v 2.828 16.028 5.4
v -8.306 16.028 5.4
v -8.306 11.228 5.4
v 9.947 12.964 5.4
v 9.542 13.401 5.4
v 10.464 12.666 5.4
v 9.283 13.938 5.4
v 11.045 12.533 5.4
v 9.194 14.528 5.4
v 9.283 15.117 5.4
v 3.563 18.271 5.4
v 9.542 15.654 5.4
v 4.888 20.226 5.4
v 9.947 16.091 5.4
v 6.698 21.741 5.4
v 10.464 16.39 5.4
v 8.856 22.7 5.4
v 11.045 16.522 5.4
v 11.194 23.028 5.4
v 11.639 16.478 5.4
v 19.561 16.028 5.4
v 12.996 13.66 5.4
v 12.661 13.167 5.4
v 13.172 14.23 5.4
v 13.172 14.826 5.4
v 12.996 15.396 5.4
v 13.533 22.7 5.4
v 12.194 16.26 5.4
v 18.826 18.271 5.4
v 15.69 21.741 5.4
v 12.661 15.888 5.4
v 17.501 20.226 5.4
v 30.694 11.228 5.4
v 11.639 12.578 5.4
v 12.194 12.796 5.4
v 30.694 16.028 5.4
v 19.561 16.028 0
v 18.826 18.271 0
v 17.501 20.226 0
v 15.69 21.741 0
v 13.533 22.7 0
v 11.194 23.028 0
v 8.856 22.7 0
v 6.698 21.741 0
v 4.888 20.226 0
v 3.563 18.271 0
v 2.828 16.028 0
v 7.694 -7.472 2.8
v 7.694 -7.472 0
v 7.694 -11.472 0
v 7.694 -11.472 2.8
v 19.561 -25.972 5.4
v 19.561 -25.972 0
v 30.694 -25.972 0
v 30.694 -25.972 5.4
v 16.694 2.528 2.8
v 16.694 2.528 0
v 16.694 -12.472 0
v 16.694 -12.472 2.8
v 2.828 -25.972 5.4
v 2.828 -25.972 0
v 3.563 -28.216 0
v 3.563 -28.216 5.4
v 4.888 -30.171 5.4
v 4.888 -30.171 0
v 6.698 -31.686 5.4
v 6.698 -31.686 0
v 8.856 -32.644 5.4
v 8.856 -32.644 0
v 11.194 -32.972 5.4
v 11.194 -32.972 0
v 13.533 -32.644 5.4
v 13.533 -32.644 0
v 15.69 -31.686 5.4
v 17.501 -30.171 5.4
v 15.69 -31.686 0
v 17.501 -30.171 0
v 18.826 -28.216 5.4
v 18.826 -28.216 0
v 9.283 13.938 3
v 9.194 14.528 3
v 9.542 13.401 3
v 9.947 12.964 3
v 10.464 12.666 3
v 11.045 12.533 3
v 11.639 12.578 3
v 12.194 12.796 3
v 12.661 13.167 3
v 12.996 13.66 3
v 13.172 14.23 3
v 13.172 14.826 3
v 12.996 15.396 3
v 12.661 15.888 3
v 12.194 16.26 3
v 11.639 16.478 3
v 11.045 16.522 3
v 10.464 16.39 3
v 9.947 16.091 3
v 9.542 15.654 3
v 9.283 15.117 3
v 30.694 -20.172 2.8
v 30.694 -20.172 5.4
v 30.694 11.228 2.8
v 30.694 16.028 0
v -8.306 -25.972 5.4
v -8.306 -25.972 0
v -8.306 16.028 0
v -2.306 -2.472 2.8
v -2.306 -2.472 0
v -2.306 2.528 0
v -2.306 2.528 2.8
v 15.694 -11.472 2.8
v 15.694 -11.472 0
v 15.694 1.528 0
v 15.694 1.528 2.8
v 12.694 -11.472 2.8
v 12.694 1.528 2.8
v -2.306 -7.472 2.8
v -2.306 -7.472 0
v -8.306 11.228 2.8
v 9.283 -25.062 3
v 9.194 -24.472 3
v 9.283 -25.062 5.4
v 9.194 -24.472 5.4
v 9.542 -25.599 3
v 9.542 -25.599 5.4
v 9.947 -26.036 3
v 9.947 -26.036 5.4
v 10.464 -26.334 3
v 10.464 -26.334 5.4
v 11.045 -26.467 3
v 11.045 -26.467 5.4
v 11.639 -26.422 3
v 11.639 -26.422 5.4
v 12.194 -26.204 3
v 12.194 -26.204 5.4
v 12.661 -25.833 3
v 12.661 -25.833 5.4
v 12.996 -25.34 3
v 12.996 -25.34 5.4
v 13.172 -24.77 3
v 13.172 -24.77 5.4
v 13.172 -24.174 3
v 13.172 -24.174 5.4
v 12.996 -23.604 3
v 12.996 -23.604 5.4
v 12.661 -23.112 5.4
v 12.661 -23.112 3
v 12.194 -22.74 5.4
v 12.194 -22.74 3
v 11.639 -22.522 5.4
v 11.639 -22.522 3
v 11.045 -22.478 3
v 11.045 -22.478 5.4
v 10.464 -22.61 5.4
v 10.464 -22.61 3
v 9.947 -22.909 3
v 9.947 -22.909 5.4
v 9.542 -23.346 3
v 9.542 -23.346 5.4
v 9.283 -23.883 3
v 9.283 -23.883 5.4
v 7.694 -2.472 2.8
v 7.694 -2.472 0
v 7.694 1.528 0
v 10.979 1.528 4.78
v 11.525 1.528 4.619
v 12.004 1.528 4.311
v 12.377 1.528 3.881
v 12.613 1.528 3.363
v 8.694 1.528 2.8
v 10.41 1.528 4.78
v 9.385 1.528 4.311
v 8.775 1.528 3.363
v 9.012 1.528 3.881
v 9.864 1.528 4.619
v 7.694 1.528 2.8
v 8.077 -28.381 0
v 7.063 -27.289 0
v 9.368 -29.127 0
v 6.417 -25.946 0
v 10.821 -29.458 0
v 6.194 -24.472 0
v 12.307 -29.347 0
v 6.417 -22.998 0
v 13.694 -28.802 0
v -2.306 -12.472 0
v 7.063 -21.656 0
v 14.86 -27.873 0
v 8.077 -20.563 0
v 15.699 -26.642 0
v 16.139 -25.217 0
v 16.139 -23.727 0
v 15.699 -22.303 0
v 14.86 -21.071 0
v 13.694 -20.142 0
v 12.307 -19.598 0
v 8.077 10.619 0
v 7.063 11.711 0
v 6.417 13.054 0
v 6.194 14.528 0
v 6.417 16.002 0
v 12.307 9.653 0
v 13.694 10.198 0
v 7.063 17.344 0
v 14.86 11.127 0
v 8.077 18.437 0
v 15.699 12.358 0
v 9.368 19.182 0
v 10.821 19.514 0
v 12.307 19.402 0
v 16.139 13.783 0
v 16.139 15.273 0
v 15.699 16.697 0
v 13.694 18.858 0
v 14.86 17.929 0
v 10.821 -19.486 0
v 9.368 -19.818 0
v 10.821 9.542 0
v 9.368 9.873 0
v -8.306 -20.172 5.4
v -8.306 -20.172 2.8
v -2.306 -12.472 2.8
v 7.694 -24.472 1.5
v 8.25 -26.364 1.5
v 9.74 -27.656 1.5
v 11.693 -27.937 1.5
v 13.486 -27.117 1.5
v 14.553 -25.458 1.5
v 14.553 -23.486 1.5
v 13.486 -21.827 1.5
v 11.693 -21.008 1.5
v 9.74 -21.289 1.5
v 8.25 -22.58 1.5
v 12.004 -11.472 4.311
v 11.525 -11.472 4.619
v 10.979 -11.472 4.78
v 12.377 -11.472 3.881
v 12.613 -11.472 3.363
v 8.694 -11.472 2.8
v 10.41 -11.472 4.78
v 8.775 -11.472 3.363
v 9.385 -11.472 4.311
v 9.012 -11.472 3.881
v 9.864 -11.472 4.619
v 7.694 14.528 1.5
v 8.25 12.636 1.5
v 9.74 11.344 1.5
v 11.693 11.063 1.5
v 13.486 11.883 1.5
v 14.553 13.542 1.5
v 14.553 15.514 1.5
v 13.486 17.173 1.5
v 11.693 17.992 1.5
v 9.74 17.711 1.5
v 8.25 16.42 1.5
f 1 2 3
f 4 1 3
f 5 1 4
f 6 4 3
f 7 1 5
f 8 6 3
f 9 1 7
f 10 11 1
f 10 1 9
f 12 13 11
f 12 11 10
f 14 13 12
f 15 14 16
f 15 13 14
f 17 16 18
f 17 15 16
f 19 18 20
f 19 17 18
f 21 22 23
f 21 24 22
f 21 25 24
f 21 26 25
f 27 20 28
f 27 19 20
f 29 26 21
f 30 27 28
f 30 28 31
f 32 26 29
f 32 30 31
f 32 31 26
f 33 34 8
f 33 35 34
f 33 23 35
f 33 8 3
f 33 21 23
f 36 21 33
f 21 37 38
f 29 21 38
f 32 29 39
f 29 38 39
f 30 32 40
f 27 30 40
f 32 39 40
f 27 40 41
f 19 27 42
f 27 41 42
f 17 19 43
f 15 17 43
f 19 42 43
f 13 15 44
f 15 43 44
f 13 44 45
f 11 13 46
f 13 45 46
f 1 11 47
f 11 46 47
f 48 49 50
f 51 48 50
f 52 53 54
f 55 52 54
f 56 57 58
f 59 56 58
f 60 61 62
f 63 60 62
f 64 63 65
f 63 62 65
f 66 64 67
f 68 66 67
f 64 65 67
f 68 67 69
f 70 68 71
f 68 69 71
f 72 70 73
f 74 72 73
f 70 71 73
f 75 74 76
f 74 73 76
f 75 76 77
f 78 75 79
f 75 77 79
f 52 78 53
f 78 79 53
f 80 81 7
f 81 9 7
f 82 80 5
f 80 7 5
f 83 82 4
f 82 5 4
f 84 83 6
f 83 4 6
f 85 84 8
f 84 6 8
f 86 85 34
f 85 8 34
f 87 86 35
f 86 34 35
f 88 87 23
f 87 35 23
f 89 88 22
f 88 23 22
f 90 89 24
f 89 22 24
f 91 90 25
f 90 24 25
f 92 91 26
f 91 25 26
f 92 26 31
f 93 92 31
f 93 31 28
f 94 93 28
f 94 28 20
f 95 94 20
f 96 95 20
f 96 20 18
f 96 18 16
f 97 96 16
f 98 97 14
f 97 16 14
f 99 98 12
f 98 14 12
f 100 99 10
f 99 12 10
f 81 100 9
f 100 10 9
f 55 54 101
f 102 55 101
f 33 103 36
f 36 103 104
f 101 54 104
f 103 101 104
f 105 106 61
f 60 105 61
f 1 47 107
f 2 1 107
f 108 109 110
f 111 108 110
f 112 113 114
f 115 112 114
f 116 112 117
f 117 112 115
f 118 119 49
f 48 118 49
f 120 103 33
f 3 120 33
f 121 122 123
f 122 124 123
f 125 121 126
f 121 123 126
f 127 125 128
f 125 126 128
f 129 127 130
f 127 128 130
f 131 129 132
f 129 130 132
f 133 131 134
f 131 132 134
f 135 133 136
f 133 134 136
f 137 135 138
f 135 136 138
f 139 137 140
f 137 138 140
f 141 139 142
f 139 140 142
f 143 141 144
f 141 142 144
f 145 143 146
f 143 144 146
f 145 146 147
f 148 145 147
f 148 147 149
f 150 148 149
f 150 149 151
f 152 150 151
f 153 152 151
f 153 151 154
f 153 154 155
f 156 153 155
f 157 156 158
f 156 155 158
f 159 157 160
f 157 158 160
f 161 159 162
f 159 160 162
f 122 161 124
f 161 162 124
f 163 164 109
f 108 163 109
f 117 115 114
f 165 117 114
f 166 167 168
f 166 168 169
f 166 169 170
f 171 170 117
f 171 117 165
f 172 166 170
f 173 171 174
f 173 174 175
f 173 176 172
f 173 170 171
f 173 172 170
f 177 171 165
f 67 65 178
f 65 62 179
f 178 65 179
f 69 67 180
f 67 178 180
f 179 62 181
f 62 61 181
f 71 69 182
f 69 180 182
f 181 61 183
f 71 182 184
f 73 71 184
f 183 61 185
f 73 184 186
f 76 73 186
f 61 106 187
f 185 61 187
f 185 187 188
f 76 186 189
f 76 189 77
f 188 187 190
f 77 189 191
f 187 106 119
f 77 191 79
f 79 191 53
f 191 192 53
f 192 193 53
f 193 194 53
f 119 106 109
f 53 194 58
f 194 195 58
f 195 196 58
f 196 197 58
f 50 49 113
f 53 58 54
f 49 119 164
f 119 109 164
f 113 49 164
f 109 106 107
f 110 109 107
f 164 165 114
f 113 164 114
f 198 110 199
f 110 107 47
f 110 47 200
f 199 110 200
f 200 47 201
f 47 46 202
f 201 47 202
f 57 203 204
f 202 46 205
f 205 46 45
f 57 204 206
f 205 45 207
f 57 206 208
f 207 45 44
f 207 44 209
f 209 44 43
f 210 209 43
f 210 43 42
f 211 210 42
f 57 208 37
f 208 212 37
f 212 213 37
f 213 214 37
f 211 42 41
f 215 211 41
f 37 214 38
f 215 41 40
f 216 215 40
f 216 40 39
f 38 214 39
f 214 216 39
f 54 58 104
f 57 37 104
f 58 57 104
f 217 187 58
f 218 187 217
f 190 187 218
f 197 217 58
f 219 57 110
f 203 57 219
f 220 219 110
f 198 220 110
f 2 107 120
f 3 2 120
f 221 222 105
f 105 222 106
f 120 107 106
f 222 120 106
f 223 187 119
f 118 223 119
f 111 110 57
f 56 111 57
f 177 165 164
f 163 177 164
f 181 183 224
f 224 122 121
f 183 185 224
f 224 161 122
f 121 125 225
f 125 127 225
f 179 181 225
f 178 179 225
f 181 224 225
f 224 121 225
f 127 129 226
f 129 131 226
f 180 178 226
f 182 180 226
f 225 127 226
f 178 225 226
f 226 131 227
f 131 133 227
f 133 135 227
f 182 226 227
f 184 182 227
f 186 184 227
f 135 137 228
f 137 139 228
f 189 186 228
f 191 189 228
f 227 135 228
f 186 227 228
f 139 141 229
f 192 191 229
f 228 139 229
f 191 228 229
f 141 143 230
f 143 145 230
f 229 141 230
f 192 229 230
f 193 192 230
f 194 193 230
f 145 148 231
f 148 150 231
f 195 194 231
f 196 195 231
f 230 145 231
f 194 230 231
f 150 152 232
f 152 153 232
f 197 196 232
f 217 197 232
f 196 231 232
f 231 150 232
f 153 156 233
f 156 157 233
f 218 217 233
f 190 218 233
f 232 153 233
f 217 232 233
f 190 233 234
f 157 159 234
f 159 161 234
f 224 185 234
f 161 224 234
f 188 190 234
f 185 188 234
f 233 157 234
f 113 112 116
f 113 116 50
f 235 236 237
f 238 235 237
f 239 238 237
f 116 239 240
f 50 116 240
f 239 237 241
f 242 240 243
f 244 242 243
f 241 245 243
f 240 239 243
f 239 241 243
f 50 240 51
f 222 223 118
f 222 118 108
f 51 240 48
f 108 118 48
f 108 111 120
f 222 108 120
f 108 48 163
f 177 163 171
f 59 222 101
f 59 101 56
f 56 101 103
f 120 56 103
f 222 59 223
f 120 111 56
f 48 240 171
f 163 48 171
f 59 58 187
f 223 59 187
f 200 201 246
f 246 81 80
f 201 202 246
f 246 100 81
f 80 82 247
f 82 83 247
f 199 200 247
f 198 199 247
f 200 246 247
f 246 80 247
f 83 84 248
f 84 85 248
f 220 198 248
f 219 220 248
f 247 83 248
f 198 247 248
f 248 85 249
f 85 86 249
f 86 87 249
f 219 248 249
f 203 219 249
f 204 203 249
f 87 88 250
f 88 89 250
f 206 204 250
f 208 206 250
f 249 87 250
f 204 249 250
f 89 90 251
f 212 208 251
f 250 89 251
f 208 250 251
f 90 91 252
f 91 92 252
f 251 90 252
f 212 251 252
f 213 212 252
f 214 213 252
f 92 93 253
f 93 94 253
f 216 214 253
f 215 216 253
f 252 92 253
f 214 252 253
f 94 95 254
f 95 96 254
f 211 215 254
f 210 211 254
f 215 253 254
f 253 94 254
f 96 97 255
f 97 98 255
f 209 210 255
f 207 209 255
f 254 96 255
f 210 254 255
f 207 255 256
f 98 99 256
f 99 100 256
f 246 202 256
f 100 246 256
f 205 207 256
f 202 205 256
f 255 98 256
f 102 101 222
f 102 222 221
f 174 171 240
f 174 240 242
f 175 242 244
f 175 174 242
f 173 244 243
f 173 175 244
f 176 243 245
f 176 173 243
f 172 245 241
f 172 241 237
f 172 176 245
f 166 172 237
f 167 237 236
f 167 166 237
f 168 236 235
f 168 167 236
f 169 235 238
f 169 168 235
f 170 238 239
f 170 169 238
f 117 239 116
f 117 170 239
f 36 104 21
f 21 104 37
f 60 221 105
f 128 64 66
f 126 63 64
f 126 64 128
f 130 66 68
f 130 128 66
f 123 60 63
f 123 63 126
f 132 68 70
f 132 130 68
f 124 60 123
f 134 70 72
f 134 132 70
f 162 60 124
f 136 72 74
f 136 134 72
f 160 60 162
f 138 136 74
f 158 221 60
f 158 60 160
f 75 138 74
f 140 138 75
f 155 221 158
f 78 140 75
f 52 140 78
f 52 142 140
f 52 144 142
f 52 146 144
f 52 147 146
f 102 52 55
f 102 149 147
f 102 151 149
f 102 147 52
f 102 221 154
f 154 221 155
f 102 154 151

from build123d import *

# Parameters (mm, degrees)
F1_DEPTH       = 5.4
F2_W           = 31.4
F2_H           = 2.6
F3_DEPTH       = 40
F4_W           = 2
F4_H           = 13
F6_D           = 4
F6_CSINK_D     = 10
F6_CSINK_ANGLE = 90


with BuildPart() as f1:
    # F0 (on Top) → F1 (new body)
    with BuildSketch(Plane.XY):
        with BuildLine():
            ThreePointArc((19.5610458605, 16.0277770907), (11.1944455951, 23.0277770907), (2.8278453298, 16.0277770907))
            Line((2.8278453298, 16.0277770907), (19.5610458605, 16.0277770907))
        make_face()
        with BuildLine():
            Line((19.5610458605, -25.9722229093), (2.8278453298, -25.9722229093))
            ThreePointArc((2.8278453298, -25.9722229093), (11.1944455951, -32.9722229093), (19.5610458605, -25.9722229093))
        make_face()
        with BuildLine():
            Line((2.8278453298, 16.0277770907), (-8.3055544049, 16.0277770907))
            Line((-8.3055544049, 16.0277770907), (-8.3055544049, -25.9722229093))
            Line((-8.3055544049, -25.9722229093), (2.8278453298, -25.9722229093))
            ThreePointArc((2.8278453298, -25.9722229093), (10.4414855216, -16.0056385255), (19.6944455951, -24.4722229093))
            ThreePointArc((19.6944455951, -24.4722229093), (19.6610299789, -25.2251829828), (19.5610458605, -25.9722229093))
            Line((19.5610458605, -25.9722229093), (30.6944455951, -25.9722229093))
            Line((30.6944455951, -25.9722229093), (30.6944455951, 16.0277770907))
            Line((30.6944455951, 16.0277770907), (19.5610458605, 16.0277770907))
            ThreePointArc((19.5610458605, 16.0277770907), (19.6610299789, 15.2807371642), (19.6944455951, 14.5277770907))
            ThreePointArc((19.6944455951, 14.5277770907), (10.4414855216, 6.0611927069), (2.8278453298, 16.0277770907))
        make_face()
        Polygon((7.6944455951, -7.4722229093), (7.6944455951, -2.4722229093), (-2.3055544049, -2.4722229093), (-2.3055544049, 2.5277770907), (7.6944455951, 2.5277770907), (16.6944455951, 2.5277770907), (16.6944455951, 1.5277770907), (16.6944455951, -11.4722229093), (16.6944455951, -12.4722229093), (7.6944455951, -12.4722229093), (-2.3055544049, -12.4722229093), (-2.3055544049, -7.4722229093), align=None, mode=Mode.SUBTRACT)
        with BuildLine():
            ThreePointArc((19.6944455951, -24.4722229093), (10.4414855216, -16.0056385255), (2.8278453298, -25.9722229093))
            Line((2.8278453298, -25.9722229093), (19.5610458605, -25.9722229093))
            ThreePointArc((19.5610458605, -25.9722229093), (19.6610299789, -25.2251829828), (19.6944455951, -24.4722229093))
        make_face()
        with BuildLine():
            Line((19.5610458605, 16.0277770907), (2.8278453298, 16.0277770907))
            ThreePointArc((2.8278453298, 16.0277770907), (10.4414855216, 6.0611927069), (19.6944455951, 14.5277770907))
            ThreePointArc((19.6944455951, 14.5277770907), (19.6610299789, 15.2807371642), (19.5610458605, 16.0277770907))
        make_face()
        Polygon((15.6944455951, 1.5277770907), (7.6944455951, 1.5277770907), (7.6944455951, -2.4722229093), (7.6944455951, -7.4722229093), (7.6944455951, -11.4722229093), (15.6944455951, -11.4722229093), align=None)
    extrude(amount=F1_DEPTH)

    # F2 (on face) → F3 (cut)
    with BuildSketch(Plane.YZ.offset(30.6944455951)):
        with Locations((-4.4722229093, 4.1)):
            Rectangle(F2_W, F2_H)
    extrude(amount=-F3_DEPTH, mode=Mode.SUBTRACT)

    # F4 (on face) → F5 (revolve)
    with BuildSketch(Plane.XY.offset(2.8)):
        with Locations((9.6944455951, -4.9722229093)):
            Rectangle(F4_W, F4_H)
    revolve(axis=Axis((10.6944455951, -4.9722229093, 2.8), (0, 1, 0)))

    # F6 (through all)
    with Locations(Plane(origin=(0, 0, 0), x_dir=(1, 0, 0), z_dir=(0, 0, -1))):
        with Locations((11.1944455951, 24.4722229093), (11.1944455951, -14.5277770907)):
            CounterSinkHole(F6_D / 2, F6_CSINK_D / 2, counter_sink_angle=F6_CSINK_ANGLE)


solid = f1.part
